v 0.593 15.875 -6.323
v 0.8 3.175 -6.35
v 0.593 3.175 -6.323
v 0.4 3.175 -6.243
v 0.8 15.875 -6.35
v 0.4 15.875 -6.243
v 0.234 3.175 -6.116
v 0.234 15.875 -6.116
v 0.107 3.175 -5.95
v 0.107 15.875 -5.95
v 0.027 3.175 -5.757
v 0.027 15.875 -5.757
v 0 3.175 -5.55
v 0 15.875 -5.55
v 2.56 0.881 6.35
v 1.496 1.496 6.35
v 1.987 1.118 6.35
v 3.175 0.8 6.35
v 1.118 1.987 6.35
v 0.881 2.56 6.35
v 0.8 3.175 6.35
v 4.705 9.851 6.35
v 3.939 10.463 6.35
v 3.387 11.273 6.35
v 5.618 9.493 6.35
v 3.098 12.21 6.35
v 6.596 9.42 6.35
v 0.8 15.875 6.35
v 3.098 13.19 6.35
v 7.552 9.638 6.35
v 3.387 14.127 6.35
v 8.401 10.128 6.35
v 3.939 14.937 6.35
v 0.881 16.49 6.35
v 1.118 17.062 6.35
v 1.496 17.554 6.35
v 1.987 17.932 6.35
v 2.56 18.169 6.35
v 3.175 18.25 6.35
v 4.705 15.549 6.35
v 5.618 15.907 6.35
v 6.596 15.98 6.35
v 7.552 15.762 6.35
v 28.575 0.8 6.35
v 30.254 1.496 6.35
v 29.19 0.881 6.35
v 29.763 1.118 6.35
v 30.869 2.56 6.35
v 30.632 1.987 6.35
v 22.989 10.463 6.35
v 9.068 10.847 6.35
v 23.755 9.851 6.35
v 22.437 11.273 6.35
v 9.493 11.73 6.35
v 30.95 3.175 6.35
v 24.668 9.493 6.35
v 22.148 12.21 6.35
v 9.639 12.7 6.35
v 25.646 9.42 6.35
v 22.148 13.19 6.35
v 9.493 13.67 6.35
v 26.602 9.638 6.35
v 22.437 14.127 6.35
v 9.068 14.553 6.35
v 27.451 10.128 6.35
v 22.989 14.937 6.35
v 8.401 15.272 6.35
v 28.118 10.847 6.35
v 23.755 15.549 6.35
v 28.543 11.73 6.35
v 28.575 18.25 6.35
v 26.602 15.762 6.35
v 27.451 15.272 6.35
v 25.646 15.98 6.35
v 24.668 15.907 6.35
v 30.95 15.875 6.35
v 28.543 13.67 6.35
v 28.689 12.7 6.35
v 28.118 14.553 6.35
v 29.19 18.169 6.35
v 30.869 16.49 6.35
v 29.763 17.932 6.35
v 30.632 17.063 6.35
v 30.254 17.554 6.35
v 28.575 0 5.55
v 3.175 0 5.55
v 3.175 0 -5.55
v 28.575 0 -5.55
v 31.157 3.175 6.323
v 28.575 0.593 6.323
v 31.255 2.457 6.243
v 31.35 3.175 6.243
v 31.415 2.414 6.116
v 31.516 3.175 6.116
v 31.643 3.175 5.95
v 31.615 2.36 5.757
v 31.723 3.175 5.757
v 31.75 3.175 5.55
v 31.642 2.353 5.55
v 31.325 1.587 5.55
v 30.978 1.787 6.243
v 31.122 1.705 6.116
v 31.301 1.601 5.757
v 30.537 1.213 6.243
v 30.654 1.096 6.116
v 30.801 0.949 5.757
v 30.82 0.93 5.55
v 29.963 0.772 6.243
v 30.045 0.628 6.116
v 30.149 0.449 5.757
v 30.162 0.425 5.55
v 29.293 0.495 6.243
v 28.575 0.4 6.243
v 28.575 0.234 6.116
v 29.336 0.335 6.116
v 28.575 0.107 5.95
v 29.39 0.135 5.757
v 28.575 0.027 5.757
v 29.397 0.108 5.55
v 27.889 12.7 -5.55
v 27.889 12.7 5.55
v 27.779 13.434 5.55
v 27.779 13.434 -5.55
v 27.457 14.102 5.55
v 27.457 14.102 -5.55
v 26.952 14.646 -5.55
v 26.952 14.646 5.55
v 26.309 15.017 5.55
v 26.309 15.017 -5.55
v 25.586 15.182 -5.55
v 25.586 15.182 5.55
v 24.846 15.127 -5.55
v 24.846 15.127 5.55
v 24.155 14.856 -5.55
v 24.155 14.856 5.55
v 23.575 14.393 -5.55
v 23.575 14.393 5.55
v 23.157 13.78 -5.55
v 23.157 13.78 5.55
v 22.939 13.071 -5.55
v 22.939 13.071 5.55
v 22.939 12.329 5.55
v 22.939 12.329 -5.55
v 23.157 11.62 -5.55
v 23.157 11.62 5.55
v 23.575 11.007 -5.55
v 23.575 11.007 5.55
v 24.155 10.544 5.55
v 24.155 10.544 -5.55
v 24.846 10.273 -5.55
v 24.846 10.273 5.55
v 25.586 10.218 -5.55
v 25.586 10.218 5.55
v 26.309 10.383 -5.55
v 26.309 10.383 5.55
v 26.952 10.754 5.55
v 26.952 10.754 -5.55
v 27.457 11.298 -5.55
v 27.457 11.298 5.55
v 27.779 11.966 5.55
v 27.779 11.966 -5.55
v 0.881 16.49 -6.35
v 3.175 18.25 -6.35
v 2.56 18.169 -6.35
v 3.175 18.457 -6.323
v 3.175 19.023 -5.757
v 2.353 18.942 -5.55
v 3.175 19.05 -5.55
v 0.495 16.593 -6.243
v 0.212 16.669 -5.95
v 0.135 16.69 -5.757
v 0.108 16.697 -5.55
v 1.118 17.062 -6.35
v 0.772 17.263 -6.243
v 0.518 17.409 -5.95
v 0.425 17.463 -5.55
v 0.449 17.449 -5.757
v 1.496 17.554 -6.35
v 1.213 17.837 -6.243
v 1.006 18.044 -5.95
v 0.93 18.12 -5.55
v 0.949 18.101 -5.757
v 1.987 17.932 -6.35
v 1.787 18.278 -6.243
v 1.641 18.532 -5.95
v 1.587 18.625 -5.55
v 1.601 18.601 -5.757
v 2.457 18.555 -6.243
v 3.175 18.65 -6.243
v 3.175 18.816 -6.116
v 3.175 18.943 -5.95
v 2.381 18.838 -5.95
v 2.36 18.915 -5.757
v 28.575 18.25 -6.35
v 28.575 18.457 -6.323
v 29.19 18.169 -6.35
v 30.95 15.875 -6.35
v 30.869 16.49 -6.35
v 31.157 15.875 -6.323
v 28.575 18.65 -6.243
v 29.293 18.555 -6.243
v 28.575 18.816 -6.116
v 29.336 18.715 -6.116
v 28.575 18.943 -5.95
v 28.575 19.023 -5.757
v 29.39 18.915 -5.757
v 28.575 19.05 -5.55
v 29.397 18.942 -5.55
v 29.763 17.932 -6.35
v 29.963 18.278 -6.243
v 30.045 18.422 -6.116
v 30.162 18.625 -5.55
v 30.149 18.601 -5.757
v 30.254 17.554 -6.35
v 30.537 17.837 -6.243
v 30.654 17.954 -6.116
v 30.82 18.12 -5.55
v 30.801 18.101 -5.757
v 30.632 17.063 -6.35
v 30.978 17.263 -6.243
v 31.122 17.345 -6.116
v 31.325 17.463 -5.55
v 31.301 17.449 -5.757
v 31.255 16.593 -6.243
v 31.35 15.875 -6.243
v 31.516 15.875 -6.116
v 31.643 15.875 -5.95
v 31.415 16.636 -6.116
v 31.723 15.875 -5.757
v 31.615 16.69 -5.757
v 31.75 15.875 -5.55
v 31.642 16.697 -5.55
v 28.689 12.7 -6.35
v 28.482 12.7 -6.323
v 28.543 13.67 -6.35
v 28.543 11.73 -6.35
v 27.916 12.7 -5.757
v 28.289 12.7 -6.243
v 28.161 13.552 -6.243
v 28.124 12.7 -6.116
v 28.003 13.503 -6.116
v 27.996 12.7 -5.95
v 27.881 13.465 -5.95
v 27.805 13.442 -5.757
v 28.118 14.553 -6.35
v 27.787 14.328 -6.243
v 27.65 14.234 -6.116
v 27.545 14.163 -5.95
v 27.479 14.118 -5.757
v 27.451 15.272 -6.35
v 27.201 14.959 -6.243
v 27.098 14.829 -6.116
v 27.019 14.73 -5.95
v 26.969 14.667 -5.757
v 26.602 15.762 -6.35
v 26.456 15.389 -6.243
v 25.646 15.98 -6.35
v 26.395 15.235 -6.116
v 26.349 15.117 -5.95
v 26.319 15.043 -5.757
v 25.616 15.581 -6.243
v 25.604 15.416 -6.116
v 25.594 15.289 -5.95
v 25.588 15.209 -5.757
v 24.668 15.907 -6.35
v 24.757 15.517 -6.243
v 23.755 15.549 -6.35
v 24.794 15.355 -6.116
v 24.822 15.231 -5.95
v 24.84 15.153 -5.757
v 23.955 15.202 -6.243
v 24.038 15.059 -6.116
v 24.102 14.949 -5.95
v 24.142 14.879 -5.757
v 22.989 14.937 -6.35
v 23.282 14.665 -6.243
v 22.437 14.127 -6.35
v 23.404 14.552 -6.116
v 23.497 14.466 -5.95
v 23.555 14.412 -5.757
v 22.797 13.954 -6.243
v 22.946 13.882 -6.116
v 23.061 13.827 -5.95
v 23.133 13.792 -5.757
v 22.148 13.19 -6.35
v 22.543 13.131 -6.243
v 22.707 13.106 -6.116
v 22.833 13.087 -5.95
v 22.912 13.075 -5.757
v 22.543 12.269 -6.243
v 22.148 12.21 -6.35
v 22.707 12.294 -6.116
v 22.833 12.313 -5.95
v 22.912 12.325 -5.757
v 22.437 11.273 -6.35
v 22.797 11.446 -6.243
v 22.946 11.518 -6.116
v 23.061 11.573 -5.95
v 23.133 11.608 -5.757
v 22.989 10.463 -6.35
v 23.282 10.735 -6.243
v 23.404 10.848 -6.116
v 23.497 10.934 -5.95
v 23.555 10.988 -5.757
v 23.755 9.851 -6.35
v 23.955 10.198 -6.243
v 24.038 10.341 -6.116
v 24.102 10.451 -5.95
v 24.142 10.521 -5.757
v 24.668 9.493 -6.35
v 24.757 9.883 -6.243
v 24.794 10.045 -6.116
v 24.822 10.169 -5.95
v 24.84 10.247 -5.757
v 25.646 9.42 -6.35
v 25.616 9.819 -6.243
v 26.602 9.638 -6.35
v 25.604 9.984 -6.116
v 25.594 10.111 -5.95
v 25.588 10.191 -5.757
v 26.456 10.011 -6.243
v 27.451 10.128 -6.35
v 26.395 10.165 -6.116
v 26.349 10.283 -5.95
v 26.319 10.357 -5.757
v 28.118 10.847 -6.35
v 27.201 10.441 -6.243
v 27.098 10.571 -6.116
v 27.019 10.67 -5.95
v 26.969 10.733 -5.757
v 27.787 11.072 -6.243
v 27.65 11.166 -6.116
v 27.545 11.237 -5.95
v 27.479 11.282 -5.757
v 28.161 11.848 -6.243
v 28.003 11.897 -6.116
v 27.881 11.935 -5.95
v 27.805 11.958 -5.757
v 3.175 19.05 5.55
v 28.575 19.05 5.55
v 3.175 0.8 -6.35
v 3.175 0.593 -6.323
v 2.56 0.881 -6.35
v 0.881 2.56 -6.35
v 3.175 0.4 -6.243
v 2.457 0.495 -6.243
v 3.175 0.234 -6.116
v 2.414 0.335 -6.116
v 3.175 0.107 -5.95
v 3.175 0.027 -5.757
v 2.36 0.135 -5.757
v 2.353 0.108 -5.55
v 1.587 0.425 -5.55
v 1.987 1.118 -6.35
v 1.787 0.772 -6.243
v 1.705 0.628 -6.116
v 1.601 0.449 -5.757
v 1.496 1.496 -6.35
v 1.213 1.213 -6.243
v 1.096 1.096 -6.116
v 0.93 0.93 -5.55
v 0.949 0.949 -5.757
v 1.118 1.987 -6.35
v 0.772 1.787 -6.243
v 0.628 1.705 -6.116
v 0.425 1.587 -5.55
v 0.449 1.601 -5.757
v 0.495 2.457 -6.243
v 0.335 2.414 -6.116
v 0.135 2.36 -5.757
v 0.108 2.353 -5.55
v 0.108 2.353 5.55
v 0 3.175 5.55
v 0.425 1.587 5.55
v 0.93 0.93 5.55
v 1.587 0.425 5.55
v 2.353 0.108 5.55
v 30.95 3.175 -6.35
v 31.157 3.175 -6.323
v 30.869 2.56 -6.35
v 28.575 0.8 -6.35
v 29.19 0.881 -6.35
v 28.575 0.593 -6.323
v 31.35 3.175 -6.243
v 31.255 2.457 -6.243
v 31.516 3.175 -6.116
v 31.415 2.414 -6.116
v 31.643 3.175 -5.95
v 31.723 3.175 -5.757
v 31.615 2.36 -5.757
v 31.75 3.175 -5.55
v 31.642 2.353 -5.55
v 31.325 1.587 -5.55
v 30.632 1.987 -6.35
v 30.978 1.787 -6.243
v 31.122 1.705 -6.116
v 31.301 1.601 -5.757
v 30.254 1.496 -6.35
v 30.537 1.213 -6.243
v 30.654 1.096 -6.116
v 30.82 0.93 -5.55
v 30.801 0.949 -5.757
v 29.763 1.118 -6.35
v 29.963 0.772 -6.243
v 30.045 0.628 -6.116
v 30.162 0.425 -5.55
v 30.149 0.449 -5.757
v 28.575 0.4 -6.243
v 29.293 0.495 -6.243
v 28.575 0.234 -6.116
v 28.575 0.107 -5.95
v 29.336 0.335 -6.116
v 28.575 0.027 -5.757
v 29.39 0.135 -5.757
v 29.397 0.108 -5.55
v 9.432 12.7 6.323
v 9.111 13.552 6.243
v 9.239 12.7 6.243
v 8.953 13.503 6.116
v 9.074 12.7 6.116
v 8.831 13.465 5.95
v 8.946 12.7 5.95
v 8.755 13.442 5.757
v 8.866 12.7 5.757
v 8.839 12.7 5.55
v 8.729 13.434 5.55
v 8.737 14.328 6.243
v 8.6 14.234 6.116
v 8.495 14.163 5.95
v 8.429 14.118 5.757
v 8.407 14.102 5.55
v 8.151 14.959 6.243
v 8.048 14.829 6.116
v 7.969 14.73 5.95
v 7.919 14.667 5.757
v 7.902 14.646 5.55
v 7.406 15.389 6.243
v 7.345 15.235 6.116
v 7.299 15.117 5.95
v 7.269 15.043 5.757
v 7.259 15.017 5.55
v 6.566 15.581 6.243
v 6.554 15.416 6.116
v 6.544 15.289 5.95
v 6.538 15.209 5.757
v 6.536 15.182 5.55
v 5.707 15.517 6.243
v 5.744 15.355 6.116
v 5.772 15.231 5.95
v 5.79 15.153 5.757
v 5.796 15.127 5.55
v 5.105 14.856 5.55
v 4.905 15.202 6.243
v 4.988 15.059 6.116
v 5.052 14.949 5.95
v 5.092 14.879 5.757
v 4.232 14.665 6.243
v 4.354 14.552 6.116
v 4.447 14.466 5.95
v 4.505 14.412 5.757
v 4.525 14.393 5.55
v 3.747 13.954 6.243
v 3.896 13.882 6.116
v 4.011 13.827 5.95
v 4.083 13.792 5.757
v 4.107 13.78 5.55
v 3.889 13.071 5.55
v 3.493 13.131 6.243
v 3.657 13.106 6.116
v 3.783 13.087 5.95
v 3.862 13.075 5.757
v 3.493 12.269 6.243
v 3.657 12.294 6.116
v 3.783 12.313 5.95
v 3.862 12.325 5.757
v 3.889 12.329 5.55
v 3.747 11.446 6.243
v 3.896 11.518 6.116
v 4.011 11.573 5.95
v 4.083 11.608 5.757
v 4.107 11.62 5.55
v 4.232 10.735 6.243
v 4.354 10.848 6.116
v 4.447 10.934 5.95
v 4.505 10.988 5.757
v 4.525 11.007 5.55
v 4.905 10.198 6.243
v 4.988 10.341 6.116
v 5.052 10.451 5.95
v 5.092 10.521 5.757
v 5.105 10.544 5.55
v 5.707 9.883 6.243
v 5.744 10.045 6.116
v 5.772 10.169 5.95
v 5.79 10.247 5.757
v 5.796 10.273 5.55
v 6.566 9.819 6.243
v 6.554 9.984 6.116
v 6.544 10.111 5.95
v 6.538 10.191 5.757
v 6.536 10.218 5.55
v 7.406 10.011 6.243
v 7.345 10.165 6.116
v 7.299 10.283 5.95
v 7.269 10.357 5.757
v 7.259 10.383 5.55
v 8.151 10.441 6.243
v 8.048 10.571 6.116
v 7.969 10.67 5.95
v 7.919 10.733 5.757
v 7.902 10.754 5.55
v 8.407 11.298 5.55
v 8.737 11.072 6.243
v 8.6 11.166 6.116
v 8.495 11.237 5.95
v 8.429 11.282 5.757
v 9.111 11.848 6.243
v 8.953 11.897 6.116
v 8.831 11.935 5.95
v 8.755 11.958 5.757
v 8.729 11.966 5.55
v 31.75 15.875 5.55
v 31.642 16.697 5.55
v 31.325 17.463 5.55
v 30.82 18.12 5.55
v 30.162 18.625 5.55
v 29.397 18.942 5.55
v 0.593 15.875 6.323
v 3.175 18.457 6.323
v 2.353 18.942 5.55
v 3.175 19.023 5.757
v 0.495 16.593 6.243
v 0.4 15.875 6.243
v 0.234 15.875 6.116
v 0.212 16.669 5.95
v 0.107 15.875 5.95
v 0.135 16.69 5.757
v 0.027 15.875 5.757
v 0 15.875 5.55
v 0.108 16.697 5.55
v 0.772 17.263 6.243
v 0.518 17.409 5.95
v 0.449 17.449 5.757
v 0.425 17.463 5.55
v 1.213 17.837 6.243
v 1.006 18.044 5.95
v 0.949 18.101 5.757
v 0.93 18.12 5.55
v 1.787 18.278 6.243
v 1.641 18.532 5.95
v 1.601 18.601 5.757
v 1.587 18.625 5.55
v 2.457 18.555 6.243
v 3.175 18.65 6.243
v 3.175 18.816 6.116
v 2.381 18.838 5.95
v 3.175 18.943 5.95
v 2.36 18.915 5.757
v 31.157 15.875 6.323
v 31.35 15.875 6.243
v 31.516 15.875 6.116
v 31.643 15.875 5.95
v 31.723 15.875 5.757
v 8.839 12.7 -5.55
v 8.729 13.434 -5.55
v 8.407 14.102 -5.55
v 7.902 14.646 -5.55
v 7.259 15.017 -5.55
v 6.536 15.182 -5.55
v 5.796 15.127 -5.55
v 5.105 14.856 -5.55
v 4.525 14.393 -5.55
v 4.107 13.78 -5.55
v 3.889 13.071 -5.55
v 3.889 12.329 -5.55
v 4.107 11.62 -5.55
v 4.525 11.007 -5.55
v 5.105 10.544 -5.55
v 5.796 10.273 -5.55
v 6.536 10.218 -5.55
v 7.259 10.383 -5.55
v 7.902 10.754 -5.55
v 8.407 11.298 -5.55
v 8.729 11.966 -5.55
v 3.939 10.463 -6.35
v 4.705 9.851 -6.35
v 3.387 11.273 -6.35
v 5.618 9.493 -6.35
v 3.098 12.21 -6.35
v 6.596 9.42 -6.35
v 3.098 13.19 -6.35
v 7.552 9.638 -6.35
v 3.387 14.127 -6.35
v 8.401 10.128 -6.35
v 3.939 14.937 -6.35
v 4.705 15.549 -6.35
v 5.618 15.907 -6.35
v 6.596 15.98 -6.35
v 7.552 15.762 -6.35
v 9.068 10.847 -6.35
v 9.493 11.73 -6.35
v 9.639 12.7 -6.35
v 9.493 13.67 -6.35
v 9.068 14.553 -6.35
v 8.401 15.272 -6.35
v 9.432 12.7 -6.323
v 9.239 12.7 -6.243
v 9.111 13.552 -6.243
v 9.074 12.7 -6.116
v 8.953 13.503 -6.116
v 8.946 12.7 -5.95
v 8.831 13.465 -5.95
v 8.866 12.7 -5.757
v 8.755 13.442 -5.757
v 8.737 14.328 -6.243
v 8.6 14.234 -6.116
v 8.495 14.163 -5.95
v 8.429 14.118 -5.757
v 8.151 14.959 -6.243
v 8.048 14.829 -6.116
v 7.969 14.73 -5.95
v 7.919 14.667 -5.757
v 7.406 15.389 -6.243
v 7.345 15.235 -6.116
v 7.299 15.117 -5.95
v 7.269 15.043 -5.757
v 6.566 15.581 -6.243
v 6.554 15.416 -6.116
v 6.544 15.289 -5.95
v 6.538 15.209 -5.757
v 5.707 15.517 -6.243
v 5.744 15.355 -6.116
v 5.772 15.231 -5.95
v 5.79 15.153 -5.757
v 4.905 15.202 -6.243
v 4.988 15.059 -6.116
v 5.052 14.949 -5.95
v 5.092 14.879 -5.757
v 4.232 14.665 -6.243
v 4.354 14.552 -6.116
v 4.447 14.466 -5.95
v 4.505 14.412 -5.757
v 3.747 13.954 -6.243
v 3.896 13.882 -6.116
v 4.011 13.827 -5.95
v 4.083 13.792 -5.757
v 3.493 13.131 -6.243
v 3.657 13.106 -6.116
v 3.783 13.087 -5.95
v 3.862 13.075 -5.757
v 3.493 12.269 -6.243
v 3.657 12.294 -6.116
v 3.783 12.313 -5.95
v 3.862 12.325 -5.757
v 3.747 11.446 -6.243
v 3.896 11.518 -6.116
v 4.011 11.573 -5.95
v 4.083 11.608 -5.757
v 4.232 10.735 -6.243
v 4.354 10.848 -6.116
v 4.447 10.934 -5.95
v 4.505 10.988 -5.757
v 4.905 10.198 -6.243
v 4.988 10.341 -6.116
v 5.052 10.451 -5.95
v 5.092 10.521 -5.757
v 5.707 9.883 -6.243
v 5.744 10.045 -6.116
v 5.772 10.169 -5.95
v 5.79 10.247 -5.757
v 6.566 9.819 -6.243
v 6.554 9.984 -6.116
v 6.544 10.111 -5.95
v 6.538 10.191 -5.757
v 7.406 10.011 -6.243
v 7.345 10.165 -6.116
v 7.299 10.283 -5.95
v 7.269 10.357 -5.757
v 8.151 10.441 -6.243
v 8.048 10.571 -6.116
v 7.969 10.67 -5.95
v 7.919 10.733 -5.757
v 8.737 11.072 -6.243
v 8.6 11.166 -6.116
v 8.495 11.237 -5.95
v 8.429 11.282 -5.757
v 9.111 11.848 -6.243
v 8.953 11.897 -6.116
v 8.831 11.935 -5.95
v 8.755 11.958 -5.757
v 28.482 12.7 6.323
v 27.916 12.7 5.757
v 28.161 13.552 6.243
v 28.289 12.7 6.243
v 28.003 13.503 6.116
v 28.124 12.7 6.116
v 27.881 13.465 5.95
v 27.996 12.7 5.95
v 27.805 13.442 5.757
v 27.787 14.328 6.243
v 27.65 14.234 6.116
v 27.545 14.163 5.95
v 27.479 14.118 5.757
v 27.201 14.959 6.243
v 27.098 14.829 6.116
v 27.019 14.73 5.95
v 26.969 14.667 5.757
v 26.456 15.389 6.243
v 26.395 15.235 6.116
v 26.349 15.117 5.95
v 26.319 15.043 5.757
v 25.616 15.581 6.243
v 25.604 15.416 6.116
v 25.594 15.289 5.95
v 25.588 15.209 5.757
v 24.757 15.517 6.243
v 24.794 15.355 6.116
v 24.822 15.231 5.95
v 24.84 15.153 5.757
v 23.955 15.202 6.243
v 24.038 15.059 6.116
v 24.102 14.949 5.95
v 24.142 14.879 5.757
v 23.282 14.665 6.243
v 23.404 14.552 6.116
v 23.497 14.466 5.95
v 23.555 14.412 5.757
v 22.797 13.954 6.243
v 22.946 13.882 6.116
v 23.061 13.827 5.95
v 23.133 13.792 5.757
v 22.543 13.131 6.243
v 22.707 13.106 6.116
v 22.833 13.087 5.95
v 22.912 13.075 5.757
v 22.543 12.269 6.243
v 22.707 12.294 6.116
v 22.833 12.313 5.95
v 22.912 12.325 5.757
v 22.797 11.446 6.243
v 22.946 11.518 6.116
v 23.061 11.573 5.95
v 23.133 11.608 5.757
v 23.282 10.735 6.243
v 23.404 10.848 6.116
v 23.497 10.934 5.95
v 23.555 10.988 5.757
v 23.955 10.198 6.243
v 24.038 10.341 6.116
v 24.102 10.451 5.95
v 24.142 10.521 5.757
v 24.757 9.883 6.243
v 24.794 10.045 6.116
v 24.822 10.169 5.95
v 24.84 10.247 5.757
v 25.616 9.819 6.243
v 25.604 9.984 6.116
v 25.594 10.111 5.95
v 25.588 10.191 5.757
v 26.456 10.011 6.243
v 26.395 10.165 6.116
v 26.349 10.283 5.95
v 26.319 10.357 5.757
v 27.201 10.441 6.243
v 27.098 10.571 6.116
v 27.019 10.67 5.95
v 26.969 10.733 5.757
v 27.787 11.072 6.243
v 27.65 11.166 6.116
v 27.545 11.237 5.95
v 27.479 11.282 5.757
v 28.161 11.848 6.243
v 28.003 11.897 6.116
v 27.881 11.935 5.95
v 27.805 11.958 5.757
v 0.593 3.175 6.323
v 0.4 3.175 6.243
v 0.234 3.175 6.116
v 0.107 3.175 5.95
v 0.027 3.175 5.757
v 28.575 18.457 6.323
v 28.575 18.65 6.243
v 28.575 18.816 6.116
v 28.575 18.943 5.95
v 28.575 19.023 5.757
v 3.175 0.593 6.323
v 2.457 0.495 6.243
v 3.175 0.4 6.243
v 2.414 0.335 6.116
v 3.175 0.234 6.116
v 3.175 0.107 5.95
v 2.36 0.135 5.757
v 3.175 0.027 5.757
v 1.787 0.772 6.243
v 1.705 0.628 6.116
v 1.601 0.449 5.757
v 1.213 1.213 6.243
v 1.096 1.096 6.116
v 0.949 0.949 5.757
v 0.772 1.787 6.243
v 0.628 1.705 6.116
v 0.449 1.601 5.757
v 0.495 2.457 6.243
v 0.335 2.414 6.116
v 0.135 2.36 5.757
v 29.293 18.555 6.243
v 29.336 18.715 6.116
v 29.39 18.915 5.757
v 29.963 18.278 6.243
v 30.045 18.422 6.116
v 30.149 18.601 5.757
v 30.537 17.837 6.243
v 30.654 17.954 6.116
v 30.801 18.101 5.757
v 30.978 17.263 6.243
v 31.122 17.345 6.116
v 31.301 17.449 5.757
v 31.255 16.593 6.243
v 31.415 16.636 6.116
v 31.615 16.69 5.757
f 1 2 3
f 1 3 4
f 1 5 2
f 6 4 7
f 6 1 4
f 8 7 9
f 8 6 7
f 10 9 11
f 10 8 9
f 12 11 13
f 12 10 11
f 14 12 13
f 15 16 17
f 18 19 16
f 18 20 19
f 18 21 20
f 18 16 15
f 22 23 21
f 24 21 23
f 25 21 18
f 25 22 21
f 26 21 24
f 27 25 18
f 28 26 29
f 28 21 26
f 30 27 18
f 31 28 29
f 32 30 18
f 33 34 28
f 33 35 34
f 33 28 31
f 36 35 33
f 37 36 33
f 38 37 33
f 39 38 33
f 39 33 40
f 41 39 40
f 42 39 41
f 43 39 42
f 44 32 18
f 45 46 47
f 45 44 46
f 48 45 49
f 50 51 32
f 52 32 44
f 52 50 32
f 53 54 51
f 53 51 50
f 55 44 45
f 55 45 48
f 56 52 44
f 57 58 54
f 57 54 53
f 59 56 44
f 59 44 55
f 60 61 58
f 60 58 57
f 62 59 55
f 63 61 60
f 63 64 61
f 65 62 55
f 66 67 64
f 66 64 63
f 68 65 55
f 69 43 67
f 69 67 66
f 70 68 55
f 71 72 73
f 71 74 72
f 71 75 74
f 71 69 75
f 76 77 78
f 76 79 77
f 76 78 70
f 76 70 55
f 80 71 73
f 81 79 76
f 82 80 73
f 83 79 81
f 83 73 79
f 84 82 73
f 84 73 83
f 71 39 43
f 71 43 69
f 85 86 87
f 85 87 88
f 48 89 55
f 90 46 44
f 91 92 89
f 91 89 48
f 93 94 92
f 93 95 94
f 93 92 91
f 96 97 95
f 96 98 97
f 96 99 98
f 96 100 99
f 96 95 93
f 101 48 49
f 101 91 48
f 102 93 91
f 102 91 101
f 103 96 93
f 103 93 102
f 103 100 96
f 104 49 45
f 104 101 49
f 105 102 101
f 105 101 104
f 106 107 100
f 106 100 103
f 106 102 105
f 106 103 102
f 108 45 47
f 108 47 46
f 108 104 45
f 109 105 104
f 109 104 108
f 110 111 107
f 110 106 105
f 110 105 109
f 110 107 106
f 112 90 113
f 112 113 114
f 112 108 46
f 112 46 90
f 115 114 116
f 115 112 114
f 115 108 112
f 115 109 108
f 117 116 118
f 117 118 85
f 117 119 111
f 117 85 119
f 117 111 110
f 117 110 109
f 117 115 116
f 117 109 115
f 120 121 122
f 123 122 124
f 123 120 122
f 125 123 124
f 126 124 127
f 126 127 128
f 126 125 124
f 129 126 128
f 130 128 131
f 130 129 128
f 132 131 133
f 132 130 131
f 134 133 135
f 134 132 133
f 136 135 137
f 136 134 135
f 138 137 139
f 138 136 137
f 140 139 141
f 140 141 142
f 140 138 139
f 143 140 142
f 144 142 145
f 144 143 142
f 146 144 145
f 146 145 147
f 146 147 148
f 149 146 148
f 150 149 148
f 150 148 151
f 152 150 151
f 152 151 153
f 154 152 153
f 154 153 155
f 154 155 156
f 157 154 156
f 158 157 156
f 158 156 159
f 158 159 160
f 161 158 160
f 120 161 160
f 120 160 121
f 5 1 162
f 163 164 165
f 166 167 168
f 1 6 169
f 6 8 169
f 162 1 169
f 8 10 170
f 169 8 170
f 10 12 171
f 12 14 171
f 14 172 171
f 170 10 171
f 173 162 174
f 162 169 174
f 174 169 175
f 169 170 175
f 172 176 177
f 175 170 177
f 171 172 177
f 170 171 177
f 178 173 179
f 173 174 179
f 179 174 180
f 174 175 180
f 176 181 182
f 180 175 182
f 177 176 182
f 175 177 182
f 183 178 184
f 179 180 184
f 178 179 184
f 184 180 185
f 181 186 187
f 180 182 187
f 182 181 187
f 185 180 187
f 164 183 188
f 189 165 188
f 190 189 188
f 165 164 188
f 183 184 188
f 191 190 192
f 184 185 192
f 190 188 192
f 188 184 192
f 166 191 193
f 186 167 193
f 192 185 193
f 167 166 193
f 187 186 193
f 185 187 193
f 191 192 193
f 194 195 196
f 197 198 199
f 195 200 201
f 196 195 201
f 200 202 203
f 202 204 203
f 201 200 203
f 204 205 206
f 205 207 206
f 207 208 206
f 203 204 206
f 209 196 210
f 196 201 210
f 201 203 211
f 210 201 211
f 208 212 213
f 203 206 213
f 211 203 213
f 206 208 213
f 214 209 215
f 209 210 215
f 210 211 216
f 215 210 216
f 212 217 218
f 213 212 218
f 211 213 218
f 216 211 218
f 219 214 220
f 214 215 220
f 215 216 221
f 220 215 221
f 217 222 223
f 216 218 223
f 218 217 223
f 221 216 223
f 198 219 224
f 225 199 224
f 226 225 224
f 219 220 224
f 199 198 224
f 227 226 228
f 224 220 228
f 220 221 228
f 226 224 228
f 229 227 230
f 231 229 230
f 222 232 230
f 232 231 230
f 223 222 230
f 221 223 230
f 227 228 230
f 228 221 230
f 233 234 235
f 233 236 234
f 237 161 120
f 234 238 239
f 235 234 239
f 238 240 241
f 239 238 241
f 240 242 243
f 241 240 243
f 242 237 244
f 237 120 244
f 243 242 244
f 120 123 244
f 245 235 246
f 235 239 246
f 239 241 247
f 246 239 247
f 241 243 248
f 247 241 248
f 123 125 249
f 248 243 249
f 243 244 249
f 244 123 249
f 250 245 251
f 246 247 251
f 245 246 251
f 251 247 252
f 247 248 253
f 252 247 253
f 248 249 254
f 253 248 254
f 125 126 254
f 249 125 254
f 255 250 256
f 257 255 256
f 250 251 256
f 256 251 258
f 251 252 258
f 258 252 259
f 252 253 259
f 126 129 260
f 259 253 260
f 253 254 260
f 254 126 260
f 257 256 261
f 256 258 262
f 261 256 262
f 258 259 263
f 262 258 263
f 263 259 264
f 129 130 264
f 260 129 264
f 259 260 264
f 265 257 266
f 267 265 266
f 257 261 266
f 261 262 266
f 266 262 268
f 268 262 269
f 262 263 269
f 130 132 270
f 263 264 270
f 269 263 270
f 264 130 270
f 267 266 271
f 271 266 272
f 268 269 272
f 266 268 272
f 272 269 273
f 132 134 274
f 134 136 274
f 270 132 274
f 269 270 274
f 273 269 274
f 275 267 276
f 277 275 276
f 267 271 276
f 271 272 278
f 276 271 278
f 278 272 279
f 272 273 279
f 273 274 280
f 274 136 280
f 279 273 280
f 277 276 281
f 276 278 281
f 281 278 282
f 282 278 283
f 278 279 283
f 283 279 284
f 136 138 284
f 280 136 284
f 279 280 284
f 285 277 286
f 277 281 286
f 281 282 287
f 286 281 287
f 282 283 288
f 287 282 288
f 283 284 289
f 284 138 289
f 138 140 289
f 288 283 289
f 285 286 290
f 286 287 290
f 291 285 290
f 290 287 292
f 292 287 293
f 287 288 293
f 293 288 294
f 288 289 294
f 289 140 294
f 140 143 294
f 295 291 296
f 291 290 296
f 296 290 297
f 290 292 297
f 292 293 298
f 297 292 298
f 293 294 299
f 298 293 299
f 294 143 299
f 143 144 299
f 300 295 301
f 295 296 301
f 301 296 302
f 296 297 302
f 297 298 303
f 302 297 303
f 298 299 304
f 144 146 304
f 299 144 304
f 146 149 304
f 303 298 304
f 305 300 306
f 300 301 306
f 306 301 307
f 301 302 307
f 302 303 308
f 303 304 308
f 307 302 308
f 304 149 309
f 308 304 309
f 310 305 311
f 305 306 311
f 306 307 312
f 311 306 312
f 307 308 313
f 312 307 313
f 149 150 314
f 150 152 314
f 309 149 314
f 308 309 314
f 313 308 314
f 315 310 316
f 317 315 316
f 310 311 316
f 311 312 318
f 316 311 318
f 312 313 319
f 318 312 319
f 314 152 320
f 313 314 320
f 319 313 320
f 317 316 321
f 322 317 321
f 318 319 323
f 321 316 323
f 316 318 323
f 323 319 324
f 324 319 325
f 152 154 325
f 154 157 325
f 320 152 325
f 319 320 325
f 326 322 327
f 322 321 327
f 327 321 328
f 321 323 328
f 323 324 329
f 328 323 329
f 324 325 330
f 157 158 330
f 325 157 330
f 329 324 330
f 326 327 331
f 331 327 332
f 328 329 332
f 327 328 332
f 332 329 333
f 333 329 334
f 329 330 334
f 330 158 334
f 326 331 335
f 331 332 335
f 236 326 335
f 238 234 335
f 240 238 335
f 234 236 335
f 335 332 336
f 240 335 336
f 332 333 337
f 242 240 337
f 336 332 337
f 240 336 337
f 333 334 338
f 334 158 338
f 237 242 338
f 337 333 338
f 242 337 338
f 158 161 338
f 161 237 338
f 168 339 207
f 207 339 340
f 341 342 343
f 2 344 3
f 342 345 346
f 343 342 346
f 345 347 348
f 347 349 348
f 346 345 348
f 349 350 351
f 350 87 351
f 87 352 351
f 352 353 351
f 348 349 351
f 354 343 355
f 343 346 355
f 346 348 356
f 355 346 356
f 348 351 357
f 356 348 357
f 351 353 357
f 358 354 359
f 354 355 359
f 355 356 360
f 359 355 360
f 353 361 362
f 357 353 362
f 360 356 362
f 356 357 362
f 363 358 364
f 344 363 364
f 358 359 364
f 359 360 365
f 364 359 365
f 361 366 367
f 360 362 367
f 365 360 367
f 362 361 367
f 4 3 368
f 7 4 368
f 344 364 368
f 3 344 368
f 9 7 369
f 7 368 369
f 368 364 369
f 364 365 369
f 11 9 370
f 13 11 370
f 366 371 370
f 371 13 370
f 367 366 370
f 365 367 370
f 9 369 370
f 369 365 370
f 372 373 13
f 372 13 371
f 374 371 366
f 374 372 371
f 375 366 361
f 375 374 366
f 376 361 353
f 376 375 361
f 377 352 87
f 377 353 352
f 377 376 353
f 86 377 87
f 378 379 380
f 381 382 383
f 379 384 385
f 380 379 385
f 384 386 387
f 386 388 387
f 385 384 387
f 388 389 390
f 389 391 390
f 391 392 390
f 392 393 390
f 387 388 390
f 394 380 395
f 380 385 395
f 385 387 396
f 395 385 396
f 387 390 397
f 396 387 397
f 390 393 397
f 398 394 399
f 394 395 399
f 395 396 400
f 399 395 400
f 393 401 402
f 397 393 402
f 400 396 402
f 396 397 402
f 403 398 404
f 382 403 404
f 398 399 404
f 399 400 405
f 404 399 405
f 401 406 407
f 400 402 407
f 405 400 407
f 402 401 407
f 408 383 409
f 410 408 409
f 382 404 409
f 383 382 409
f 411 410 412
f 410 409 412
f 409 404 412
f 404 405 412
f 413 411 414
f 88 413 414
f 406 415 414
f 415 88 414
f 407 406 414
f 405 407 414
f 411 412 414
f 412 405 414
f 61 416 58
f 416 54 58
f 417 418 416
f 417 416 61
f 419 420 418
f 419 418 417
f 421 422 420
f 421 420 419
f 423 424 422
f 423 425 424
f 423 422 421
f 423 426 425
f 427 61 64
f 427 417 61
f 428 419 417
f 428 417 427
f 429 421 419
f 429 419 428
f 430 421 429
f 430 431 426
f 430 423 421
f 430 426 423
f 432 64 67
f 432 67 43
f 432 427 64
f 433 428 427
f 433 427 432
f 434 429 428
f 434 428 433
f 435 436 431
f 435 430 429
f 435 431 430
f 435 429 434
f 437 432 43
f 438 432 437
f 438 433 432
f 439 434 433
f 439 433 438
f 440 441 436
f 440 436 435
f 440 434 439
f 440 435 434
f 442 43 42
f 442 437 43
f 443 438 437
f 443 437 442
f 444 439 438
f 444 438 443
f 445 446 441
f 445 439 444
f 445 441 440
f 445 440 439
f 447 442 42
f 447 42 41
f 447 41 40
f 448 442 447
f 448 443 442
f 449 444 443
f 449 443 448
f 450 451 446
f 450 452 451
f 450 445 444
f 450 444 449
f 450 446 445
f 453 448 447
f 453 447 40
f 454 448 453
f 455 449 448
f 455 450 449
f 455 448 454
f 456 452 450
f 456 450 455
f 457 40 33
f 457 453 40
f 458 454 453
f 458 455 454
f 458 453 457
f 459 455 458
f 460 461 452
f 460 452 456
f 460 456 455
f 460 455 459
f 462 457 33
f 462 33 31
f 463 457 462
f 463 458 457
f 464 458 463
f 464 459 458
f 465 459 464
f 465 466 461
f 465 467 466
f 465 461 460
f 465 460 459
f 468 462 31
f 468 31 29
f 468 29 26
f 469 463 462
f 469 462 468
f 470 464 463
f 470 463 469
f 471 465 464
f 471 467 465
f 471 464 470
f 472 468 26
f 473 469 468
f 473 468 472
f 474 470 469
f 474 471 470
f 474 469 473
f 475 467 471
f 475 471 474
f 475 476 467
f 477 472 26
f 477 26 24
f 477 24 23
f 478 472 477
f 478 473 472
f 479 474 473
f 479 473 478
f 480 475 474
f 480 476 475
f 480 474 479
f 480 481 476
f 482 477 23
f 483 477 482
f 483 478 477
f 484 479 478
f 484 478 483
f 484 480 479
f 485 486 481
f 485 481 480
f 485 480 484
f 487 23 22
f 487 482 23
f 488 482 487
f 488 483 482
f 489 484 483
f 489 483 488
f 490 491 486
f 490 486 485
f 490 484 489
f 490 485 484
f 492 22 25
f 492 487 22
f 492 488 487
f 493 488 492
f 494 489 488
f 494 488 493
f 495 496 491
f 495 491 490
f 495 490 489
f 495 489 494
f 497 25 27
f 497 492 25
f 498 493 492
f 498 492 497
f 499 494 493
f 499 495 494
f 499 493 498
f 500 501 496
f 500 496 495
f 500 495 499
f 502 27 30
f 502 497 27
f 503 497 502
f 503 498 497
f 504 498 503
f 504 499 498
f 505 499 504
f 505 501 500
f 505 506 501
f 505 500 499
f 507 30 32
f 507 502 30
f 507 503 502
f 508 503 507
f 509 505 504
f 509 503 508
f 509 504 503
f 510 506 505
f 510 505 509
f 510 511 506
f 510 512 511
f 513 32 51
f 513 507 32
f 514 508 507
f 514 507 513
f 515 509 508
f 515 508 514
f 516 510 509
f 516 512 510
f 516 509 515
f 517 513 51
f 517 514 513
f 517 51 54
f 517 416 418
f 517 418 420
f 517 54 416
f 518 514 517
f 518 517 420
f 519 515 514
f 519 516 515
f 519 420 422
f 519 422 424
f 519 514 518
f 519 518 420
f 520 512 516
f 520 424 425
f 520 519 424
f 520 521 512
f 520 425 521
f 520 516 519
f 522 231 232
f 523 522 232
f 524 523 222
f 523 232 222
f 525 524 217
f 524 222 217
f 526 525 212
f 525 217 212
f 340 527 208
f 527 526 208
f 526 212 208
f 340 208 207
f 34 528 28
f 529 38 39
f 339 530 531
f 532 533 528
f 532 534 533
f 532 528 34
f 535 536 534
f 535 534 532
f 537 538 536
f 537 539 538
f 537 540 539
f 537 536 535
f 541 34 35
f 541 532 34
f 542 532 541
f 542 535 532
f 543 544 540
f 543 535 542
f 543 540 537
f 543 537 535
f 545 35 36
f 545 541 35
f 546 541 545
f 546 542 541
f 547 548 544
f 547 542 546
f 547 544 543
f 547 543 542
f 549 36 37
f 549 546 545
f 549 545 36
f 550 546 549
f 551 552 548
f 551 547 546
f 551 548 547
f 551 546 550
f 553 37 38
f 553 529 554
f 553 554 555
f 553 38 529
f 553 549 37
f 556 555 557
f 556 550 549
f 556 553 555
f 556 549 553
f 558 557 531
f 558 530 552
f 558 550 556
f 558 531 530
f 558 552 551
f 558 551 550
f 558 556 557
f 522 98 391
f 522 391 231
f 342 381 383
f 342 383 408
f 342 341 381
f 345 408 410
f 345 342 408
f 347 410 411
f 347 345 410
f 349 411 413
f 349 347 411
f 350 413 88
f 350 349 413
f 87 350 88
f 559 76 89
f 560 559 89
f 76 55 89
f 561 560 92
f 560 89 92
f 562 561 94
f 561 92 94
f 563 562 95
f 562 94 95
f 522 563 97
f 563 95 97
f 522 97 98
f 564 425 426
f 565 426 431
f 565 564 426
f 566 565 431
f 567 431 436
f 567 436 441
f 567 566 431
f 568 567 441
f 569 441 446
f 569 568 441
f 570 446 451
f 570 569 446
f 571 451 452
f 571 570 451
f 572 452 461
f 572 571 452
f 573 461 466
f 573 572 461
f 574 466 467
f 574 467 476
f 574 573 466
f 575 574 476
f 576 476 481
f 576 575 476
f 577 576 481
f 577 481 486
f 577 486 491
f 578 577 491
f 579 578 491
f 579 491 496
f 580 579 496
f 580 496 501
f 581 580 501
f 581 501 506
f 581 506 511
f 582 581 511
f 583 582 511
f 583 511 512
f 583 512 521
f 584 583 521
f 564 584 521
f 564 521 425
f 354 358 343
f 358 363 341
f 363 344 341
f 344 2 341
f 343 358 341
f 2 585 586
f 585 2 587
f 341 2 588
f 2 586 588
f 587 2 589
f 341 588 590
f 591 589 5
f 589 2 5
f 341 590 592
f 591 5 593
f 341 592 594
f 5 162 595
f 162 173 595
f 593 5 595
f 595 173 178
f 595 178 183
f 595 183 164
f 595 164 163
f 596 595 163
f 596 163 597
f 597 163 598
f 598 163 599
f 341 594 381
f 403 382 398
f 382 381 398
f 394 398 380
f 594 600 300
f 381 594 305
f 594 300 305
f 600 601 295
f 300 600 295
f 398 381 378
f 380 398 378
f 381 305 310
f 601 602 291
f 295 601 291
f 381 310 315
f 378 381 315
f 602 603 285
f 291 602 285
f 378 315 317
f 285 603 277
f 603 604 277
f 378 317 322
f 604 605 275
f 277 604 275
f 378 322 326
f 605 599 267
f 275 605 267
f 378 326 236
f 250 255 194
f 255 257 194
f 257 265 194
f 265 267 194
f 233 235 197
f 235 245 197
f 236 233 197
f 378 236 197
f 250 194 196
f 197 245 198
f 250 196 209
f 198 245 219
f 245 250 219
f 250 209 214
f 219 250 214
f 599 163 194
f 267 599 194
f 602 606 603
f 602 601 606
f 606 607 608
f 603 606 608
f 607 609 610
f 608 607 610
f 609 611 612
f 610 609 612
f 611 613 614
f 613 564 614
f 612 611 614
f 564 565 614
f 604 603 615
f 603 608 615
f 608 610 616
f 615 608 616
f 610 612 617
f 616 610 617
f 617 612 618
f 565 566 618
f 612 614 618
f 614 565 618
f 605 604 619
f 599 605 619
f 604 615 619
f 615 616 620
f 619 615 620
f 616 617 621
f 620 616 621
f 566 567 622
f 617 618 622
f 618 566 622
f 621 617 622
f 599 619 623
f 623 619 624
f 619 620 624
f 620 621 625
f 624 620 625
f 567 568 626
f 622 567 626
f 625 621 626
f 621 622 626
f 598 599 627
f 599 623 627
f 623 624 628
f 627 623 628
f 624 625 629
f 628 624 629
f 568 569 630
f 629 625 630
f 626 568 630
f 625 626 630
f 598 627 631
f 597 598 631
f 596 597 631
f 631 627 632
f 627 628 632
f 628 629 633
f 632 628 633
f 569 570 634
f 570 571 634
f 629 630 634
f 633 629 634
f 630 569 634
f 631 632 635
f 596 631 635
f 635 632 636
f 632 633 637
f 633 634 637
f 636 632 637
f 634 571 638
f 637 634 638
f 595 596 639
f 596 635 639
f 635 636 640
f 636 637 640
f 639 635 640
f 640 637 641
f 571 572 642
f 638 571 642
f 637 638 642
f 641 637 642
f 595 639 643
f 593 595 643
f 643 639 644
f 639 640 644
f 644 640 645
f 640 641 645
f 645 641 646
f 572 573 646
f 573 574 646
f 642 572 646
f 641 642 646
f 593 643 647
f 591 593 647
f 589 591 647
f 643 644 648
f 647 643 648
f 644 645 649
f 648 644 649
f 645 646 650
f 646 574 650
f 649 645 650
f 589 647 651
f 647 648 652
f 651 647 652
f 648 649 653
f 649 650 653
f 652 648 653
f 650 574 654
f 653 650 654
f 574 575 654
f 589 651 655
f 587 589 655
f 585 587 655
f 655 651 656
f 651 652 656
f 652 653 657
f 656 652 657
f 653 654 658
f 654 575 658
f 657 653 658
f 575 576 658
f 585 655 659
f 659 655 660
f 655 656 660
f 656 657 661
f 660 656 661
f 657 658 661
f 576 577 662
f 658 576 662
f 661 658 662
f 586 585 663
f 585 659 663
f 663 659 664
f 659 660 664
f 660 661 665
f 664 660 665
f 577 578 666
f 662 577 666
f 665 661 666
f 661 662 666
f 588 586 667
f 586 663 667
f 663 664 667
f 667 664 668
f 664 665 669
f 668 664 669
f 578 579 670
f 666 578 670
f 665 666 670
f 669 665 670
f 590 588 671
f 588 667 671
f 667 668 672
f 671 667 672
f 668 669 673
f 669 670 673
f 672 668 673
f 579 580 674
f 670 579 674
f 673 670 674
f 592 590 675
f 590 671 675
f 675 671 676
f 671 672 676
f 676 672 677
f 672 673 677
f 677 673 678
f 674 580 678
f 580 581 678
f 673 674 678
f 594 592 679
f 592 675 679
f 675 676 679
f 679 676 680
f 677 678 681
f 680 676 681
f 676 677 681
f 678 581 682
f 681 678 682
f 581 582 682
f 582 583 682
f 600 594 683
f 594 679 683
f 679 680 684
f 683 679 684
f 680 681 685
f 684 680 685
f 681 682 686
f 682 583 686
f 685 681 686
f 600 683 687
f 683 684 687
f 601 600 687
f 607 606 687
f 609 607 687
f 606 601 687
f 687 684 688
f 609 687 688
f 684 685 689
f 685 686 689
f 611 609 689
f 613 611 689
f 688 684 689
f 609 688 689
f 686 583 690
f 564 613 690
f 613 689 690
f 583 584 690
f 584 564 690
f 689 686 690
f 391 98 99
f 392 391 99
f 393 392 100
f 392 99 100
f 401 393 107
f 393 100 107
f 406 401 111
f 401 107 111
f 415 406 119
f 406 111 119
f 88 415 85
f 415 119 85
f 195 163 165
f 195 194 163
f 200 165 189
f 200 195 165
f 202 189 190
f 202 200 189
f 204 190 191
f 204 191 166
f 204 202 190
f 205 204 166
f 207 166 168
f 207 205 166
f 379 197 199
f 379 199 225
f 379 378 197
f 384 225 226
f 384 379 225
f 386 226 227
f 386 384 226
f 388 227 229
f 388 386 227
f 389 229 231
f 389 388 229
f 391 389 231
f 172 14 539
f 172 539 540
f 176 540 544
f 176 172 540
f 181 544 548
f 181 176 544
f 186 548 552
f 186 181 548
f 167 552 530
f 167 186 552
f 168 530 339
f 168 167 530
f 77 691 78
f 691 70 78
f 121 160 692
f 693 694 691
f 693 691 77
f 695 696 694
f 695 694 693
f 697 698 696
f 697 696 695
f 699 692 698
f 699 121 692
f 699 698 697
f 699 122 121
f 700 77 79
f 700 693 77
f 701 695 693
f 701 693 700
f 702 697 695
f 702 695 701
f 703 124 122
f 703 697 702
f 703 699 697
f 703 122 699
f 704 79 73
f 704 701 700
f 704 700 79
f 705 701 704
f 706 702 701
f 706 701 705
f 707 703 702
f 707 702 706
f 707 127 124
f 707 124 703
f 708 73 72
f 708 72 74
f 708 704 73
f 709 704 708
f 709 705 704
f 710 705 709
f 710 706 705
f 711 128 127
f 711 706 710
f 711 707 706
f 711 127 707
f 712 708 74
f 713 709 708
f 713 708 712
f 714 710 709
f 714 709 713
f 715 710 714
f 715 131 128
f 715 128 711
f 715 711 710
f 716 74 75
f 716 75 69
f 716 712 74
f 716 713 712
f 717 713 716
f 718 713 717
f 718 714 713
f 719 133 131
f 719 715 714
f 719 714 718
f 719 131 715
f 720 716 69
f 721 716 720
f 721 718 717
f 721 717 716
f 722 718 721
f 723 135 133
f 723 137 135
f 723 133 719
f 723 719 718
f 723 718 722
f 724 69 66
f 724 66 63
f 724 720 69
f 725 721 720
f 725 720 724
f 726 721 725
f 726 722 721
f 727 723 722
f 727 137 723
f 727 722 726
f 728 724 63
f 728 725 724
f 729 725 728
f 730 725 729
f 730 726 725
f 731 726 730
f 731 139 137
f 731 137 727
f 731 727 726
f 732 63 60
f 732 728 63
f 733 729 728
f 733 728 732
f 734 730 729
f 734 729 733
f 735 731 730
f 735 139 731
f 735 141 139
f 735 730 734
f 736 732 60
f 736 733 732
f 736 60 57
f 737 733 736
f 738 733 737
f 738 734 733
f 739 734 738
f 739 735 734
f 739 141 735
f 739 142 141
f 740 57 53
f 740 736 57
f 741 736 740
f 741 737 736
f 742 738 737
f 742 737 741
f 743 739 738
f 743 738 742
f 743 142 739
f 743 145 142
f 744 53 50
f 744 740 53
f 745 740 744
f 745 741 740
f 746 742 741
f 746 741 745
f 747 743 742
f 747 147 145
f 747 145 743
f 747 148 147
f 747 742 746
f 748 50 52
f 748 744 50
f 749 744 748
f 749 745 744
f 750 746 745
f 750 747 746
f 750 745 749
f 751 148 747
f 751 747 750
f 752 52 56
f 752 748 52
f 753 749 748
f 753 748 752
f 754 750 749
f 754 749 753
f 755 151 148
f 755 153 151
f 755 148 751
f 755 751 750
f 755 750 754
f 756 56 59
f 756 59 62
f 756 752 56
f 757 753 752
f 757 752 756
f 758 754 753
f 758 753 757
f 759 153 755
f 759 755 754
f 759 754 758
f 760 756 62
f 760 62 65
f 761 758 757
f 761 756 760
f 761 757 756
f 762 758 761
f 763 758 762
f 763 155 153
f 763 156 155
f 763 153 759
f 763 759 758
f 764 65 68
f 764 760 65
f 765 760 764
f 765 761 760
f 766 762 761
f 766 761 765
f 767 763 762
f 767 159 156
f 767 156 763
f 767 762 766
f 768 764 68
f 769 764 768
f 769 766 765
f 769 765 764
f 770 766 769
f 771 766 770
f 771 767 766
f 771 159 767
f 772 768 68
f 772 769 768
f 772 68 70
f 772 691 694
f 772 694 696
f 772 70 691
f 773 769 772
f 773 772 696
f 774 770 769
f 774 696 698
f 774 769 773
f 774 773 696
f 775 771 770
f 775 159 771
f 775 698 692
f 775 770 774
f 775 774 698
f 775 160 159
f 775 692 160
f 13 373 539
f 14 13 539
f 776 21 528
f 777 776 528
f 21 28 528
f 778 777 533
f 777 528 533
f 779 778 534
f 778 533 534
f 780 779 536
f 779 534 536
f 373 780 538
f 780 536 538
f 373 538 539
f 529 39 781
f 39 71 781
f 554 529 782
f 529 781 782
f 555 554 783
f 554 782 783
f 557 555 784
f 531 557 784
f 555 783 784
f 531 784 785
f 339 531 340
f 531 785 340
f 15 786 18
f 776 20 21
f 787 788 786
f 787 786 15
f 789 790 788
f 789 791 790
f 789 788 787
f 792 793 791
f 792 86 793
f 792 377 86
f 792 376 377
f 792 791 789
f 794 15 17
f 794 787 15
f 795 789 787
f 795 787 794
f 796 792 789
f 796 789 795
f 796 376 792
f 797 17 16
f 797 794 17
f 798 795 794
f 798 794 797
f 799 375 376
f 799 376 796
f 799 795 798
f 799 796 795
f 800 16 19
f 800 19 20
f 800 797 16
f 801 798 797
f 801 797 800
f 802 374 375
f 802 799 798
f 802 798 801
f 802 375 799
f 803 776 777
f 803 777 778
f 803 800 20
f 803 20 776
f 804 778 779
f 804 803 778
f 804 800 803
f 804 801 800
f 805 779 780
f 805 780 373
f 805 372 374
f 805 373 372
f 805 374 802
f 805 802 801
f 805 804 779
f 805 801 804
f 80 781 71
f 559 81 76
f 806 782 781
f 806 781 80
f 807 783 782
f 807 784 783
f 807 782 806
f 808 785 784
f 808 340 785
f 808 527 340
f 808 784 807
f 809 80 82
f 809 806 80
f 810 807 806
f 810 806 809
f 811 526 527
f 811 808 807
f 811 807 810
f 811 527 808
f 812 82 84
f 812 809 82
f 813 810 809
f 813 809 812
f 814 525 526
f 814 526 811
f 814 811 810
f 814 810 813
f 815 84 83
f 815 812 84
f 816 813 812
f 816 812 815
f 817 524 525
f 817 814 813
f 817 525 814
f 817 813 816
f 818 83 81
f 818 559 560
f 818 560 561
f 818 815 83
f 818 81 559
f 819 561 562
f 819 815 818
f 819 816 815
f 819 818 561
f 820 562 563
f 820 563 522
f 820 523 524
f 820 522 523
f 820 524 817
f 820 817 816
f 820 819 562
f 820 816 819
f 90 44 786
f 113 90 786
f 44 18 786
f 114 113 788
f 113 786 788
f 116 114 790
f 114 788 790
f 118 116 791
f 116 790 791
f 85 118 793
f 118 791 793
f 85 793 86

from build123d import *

# Parameters (mm, degrees)
SKETCH1_W           = 31.75
SKETCH1_H           = 19.05
SKETCH1_R           = 2.4892
BOSS_EXTRUDE1_DEPTH = 6.35
FILLET1_R           = 3.175
FILLET2_R           = 0.8


with BuildPart() as part:
    # Sketch1 → Boss-Extrude1 (new, symmetric)
    with BuildSketch(Plane.XY):
        with Locations((15.875, 9.525)):
            Rectangle(SKETCH1_W, SKETCH1_H)
        with Locations((6.35, 12.7)):
            Circle(SKETCH1_R, mode=Mode.SUBTRACT)
        with Locations((25.4, 12.7)):
            Circle(SKETCH1_R, mode=Mode.SUBTRACT)
    extrude(amount=BOSS_EXTRUDE1_DEPTH, both=True)

    # Fillet1
    fillet1_edges = [part.edges().sort_by_distance(p)[0] for p in [
        (0, 19.05, 0),
        (31.75, 19.05, 0),
        (31.75, 0, 0),
        (0, 0, 0),
    ]]
    fillet(fillet1_edges, radius=FILLET1_R)

    # Fillet2
    fillet2_edges = [part.edges().sort_by_distance(p)[0] for p in [
        (3.8608, 12.7, -6.35),
        (3.8608, 12.7, 6.35),
        (22.9108, 12.7, -6.35),
        (22.9108, 12.7, 6.35),
        (15.875, 19.05, -6.35),
        (15.875, 19.05, 6.35),
        (0, 9.525, -6.35),
        (31.75, 9.525, -6.35),
        (15.875, 0, -6.35),
        (0.92993597, 18.12006403, -6.35),
        (0.92993597, 0.92993597, -6.35),
        (30.82006403, 0.92993597, -6.35),
        (30.82006403, 18.12006403, -6.35),
        (31.75, 9.525, 6.35),
        (0, 9.525, 6.35),
        (15.875, 0, 6.35),
        (0.92993597, 18.12006403, 6.35),
        (0.92993597, 0.92993597, 6.35),
        (30.82006403, 0.92993597, 6.35),
        (30.82006403, 18.12006403, 6.35),
    ]]
    fillet(fillet2_edges, radius=FILLET2_R)


solid = part.part
